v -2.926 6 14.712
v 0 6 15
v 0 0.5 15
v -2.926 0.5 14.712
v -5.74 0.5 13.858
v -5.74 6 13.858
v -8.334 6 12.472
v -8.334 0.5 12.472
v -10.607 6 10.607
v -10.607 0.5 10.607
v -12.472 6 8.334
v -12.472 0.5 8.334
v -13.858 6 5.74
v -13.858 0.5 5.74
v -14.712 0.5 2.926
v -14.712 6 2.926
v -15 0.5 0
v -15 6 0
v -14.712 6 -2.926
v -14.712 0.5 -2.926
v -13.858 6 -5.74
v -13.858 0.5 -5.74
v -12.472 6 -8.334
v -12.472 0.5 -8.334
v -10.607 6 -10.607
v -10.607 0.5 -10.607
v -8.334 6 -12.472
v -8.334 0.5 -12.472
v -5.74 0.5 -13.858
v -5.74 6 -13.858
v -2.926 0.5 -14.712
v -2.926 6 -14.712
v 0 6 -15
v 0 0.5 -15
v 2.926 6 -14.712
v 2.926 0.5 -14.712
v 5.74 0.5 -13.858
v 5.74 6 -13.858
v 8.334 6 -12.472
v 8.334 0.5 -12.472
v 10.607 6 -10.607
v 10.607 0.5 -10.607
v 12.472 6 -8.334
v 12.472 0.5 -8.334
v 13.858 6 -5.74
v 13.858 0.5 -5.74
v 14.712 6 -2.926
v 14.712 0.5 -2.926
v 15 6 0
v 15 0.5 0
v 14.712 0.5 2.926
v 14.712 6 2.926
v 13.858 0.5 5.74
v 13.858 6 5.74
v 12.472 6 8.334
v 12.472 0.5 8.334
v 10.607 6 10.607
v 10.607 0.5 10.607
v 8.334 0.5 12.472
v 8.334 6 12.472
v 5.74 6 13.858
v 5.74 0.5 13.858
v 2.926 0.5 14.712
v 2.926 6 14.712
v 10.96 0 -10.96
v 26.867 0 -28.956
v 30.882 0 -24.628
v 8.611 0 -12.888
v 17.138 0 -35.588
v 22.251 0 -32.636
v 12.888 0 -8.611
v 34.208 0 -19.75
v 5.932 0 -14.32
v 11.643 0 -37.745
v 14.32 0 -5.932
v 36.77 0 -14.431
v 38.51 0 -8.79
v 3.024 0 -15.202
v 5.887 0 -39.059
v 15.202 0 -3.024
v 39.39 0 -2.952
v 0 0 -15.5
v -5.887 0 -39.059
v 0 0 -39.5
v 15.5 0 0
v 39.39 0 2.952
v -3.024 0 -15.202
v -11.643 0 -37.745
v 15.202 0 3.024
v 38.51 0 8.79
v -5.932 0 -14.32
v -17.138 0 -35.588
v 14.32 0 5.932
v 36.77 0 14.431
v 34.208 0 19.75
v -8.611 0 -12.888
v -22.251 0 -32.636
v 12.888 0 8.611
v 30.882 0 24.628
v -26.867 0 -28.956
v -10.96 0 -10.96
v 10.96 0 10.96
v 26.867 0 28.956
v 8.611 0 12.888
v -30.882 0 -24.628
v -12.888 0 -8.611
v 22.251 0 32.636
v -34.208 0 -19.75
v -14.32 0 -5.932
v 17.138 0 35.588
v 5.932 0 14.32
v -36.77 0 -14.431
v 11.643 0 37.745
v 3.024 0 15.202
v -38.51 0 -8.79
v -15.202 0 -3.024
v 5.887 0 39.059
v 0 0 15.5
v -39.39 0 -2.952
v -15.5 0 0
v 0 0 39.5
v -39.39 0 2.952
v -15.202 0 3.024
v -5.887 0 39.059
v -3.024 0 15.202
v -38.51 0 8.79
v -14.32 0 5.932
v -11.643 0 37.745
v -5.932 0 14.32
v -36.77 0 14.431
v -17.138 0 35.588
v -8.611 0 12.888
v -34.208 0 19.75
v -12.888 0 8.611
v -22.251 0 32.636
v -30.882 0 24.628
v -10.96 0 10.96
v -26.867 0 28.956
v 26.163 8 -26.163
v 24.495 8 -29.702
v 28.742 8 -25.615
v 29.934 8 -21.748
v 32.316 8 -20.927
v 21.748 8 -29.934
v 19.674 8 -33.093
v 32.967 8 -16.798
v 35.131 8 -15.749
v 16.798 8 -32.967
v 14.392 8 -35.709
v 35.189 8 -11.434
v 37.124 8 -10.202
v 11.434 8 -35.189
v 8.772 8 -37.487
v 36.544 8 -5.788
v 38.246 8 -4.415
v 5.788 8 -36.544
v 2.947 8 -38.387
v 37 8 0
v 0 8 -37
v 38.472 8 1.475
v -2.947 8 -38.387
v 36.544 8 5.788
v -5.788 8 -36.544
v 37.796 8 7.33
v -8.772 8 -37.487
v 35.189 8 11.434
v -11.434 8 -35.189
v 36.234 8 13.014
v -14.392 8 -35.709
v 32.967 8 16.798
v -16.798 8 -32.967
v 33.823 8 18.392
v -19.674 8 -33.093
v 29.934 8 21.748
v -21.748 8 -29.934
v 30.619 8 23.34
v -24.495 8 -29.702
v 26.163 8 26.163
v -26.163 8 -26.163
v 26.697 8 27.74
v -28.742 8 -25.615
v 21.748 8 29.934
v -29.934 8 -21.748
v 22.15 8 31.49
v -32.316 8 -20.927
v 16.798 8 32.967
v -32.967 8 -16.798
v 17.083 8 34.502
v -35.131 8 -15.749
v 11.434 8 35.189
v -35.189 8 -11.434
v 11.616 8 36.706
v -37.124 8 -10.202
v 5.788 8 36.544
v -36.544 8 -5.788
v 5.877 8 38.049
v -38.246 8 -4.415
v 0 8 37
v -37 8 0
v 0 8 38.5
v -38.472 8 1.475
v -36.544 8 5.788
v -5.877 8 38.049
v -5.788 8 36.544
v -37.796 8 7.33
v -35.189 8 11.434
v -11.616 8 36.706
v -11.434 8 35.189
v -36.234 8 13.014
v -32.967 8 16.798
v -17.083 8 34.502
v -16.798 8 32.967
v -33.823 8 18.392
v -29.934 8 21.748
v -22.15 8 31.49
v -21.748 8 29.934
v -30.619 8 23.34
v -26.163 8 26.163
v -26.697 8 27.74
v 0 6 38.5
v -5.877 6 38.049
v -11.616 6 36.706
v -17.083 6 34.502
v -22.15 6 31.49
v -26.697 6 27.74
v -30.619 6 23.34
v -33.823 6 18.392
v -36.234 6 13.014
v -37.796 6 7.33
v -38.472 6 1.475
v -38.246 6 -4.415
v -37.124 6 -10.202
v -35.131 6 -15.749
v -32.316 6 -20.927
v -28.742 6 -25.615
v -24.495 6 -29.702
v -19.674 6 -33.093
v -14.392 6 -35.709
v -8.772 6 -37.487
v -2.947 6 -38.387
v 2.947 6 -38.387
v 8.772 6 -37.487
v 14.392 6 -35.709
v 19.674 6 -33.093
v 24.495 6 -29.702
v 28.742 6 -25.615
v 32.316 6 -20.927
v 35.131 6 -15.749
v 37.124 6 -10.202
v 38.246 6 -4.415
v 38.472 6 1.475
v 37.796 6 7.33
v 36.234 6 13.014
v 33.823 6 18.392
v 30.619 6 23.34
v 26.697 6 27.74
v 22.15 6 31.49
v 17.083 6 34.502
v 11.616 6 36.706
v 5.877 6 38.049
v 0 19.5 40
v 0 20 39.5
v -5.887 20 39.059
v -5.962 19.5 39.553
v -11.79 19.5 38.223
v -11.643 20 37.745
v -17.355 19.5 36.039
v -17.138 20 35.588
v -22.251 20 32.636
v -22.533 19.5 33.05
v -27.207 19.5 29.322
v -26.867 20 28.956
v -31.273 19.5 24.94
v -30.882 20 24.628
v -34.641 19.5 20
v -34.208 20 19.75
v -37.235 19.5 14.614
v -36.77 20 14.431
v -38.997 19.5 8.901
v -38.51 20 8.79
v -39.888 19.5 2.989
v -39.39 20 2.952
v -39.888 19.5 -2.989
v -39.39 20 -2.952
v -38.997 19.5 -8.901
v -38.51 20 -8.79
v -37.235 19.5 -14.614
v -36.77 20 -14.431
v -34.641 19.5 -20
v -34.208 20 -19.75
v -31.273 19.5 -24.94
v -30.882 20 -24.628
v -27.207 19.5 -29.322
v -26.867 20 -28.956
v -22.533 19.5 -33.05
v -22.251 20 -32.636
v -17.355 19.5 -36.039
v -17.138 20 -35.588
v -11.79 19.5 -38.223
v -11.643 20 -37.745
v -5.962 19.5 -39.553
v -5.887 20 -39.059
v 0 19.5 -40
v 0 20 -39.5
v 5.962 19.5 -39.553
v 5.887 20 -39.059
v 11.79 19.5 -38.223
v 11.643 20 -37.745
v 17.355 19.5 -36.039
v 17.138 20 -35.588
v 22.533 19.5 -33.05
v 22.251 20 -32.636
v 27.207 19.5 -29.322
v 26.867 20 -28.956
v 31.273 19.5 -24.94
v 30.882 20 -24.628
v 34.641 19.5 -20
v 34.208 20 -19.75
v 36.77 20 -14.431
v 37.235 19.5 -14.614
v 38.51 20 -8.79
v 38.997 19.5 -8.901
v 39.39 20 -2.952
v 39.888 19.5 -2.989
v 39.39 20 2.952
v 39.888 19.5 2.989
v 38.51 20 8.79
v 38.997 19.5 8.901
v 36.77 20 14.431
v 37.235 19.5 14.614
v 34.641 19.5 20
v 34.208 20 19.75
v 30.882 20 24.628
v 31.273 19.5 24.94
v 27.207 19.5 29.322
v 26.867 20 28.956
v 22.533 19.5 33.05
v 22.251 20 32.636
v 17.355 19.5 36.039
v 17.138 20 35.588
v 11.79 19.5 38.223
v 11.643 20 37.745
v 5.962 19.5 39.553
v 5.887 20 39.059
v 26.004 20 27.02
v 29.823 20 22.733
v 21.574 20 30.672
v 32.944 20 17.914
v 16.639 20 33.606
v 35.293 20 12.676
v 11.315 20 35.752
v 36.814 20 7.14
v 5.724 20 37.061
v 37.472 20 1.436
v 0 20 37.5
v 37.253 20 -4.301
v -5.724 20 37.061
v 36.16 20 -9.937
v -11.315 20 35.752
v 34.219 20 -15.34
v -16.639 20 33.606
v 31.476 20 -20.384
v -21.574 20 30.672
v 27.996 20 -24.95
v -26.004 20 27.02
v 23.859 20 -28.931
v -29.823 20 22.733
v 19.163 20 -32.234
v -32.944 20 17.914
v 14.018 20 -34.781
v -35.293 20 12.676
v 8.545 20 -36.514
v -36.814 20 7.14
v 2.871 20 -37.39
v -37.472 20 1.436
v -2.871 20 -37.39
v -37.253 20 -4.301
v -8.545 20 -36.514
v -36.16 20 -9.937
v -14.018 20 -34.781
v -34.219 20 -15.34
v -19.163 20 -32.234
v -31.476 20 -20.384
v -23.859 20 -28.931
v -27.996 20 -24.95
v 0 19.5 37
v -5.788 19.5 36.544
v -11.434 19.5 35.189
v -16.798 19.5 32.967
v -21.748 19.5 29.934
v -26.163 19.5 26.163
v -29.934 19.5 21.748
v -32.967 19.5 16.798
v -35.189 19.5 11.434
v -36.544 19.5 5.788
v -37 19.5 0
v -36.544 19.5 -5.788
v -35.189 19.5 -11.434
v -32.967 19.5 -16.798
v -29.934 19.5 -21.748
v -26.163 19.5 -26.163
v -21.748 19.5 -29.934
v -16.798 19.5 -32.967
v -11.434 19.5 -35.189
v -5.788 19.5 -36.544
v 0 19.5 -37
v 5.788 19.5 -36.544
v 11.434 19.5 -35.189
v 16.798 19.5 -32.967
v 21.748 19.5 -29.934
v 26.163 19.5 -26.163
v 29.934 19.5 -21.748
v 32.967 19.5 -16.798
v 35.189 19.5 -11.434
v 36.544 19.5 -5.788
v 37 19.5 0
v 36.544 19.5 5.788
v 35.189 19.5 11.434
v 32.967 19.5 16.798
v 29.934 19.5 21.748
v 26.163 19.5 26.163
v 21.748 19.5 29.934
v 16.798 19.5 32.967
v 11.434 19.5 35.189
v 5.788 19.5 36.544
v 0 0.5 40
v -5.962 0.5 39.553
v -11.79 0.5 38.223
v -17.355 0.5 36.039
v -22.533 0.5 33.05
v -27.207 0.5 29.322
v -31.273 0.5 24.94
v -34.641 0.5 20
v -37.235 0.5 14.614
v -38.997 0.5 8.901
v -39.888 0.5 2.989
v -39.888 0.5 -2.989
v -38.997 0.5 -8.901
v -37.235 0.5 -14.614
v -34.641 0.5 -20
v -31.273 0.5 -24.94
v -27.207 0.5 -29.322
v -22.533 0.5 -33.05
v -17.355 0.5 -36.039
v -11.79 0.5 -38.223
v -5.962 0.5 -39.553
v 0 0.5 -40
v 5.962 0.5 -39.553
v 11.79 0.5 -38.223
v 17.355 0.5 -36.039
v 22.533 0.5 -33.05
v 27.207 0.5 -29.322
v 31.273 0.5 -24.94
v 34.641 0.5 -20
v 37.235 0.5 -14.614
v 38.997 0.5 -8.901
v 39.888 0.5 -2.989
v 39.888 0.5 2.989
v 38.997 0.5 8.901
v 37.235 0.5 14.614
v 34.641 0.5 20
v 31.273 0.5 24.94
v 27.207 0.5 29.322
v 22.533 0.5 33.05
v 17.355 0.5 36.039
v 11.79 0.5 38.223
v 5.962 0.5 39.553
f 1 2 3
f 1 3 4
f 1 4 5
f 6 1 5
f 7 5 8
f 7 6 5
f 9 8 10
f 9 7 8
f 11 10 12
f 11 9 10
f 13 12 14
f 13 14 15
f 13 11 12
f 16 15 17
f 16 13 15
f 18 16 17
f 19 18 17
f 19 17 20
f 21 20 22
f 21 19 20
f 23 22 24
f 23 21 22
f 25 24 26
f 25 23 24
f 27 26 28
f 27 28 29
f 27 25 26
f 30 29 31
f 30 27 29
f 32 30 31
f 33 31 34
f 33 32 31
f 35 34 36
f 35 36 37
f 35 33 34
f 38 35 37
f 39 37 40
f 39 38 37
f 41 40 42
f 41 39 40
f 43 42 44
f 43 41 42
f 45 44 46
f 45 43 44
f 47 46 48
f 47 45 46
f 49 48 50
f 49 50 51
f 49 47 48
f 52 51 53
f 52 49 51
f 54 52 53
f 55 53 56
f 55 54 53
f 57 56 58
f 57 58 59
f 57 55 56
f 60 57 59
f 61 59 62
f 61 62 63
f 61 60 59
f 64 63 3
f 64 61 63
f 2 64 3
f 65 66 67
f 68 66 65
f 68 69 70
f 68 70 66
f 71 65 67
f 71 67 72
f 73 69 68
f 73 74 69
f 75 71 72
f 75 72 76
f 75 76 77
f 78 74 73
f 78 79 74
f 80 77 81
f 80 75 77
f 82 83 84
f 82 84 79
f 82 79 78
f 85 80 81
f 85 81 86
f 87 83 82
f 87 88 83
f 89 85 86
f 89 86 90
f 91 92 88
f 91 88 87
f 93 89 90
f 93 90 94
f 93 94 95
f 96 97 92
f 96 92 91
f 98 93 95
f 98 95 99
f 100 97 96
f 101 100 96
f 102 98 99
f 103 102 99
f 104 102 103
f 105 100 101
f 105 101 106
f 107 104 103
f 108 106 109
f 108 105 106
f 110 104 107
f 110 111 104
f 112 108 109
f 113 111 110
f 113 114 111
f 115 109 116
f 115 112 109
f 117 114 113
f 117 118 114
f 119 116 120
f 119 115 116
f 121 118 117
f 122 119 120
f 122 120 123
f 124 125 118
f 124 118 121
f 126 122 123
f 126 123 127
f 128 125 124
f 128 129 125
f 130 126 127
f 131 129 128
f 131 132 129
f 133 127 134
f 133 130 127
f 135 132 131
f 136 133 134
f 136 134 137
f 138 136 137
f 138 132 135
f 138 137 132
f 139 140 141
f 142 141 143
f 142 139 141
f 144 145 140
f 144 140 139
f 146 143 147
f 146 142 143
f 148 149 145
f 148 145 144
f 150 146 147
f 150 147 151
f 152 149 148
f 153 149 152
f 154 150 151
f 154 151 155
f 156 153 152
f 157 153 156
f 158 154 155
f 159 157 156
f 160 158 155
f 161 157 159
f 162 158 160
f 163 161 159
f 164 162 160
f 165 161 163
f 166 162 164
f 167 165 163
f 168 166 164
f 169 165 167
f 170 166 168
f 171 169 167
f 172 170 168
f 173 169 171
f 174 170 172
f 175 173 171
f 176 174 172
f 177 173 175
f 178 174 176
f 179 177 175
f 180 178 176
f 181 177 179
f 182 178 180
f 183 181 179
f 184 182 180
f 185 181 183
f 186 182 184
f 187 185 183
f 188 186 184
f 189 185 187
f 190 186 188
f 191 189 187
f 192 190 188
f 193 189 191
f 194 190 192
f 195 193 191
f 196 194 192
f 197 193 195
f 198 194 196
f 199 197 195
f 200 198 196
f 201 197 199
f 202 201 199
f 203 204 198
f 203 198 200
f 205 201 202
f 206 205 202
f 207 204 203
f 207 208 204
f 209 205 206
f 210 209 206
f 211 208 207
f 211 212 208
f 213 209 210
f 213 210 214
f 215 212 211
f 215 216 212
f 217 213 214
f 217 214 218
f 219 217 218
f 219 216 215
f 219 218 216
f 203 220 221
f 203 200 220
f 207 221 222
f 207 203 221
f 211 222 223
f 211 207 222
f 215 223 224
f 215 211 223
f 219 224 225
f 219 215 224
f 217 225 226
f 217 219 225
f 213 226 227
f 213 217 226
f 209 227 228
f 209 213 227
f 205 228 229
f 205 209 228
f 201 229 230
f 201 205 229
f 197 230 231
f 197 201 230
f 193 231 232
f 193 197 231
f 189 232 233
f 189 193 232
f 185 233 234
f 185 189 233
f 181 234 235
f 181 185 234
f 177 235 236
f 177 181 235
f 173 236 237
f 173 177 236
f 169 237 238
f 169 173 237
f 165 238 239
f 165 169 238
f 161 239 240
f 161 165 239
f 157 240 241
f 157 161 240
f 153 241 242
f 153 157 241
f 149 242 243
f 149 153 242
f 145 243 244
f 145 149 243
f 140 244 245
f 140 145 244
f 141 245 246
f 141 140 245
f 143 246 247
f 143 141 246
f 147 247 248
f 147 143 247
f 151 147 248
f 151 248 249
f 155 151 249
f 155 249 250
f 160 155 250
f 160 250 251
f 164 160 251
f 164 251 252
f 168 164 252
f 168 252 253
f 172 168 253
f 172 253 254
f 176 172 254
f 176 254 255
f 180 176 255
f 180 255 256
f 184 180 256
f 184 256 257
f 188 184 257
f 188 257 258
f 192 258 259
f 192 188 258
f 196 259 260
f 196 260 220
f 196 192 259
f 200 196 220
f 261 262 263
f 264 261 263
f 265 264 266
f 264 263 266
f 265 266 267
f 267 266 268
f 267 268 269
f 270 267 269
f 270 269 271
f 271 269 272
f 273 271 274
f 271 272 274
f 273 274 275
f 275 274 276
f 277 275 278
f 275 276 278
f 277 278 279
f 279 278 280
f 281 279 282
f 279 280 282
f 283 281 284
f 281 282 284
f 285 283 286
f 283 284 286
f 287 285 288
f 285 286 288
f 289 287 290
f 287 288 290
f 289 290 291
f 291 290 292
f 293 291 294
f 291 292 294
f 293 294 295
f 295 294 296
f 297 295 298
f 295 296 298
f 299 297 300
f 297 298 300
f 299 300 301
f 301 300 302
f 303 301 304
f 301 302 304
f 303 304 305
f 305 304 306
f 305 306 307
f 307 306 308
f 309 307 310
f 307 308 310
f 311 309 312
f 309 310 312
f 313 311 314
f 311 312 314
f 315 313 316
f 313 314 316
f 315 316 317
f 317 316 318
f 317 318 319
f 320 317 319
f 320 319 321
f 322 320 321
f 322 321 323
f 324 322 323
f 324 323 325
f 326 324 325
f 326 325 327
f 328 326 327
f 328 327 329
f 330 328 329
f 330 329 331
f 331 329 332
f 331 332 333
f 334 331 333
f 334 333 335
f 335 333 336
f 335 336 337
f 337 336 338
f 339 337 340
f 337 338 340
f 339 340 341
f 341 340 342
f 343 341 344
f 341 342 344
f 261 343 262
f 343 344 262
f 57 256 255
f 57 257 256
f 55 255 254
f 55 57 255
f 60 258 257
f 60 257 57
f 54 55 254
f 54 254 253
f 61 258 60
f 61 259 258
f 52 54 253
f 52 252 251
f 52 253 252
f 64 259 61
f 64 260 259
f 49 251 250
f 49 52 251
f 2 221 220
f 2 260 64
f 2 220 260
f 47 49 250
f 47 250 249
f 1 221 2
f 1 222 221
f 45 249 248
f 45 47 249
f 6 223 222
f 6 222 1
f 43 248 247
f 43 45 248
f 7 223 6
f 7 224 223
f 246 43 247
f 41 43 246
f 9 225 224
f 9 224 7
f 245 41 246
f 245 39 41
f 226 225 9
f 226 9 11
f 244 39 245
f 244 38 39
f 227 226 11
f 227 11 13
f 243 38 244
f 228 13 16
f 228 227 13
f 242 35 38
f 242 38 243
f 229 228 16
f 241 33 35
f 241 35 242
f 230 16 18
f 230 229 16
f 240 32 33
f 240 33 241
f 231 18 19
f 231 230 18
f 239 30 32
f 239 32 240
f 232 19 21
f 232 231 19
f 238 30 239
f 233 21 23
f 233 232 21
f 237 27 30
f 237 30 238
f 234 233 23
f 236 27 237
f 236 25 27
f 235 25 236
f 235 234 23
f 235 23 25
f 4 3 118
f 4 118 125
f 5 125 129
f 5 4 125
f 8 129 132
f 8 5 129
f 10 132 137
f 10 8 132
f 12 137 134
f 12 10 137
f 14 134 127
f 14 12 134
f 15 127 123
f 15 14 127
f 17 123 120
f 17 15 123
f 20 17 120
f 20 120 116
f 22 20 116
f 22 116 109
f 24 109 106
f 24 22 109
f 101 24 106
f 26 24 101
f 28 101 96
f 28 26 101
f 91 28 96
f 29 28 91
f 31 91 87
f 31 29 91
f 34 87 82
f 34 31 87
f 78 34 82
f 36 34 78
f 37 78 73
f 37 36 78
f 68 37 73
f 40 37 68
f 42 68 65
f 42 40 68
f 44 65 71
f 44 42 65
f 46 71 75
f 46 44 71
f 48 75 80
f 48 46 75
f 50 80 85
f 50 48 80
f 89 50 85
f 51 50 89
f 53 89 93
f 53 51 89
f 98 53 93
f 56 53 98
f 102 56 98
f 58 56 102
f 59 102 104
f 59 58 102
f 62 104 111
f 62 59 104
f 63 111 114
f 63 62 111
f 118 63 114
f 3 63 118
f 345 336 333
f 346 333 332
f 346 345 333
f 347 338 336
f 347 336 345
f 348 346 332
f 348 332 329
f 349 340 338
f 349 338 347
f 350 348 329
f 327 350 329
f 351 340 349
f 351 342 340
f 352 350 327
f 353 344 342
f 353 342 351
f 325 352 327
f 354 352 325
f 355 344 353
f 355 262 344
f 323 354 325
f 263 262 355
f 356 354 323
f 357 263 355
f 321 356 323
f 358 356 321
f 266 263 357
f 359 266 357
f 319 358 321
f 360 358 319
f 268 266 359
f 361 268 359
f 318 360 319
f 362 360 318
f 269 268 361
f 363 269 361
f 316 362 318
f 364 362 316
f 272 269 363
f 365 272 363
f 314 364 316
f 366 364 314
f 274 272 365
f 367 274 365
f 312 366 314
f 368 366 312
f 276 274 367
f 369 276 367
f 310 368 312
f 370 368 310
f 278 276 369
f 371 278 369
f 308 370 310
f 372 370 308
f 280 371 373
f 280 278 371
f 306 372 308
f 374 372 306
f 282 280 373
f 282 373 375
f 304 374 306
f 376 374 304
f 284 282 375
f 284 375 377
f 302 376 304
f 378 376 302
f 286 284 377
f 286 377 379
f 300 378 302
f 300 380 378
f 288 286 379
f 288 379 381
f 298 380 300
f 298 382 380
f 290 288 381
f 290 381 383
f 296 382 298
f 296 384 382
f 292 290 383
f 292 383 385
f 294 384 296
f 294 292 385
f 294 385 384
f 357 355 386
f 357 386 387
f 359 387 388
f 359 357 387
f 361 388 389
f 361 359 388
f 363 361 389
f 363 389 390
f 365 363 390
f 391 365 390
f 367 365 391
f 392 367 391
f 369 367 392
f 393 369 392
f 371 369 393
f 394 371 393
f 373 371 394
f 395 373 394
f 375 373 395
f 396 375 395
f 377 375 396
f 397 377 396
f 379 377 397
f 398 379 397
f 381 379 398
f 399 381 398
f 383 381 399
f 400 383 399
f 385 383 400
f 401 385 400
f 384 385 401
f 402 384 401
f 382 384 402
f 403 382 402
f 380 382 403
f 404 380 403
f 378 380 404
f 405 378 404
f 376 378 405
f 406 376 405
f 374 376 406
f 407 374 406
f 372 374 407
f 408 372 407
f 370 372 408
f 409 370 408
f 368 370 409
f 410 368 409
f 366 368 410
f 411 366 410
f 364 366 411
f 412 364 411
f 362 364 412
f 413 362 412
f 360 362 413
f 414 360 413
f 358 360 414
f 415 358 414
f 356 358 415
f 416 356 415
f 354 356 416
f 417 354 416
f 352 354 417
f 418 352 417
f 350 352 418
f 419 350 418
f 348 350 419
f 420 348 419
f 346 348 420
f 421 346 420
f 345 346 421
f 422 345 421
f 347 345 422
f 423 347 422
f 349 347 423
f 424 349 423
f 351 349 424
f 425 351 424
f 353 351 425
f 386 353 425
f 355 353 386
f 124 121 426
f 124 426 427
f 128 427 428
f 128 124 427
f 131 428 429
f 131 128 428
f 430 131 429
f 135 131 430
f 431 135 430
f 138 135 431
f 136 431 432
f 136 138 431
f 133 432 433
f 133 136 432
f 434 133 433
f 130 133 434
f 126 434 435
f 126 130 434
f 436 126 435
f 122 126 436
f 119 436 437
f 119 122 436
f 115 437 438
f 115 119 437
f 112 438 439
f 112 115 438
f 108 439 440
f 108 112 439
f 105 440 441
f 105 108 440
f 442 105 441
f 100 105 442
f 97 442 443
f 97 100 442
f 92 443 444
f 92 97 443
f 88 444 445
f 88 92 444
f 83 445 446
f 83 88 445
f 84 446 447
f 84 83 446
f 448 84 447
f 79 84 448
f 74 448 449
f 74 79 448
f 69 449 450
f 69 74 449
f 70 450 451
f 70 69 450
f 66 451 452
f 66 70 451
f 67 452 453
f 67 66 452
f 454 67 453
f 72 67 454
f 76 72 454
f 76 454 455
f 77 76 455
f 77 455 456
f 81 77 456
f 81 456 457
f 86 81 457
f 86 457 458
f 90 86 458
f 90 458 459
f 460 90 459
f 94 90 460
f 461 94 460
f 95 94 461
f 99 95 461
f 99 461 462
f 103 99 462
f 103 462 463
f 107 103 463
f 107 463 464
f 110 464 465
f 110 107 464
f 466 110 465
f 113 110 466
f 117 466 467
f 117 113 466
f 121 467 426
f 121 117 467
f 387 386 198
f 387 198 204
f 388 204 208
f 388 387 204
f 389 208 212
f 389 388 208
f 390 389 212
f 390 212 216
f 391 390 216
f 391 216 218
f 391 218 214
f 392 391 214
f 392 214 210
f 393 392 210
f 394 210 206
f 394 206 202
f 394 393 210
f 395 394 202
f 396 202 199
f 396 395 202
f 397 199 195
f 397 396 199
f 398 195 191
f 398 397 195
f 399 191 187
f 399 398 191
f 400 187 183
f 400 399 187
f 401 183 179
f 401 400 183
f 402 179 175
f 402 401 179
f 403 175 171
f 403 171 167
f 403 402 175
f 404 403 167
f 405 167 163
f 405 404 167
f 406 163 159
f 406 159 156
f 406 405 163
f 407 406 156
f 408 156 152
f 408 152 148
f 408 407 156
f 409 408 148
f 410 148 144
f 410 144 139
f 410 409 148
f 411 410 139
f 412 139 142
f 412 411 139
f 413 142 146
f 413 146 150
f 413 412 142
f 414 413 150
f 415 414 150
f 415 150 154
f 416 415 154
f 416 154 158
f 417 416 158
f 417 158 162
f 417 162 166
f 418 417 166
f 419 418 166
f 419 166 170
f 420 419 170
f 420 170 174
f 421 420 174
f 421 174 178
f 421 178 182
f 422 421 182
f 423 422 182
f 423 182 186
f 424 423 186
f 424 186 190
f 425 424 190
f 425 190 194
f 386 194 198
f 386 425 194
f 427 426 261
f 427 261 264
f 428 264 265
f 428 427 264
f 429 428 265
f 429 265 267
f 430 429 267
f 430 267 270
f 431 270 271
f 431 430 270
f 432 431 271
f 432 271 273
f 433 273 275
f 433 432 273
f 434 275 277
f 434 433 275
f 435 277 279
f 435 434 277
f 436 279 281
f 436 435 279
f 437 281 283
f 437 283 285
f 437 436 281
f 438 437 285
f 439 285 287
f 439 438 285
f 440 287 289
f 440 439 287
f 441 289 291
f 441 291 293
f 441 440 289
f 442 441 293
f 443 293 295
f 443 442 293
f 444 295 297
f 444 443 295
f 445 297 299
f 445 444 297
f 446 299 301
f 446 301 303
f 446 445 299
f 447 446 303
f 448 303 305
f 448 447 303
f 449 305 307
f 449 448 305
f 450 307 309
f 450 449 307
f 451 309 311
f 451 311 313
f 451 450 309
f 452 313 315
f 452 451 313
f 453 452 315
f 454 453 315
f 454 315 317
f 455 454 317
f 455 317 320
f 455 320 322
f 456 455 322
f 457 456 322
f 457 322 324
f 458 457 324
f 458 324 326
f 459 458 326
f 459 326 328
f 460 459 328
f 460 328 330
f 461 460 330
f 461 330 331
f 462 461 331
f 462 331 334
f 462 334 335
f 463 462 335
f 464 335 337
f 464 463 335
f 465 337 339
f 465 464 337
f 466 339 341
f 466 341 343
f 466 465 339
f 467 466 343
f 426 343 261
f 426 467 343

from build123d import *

# Parameters (mm, degrees)
CHAMFER_1_SIZE = 0.5


with BuildPart() as part:
    # Эскиз1 → Повернуть1 (revolve)
    with BuildSketch(Plane.XY):
        Polygon((-40, 20), (-40, 0), (-15, 0), (-15, 6), (-38.5, 6), (-38.5, 8), (-37, 8), (-37, 20), align=None)
    revolve(axis=Axis((0, 26.168985987, 0), (0, -1, 0)))

    # Фаска1
    chamfer_1_edges = [part.edges().sort_by_distance(p)[0] for p in [
        (15, 0, 0),
        (40, 0, 0),
        (40, 20, 0),
        (37, 20, 0),
    ]]
    chamfer(chamfer_1_edges, length=CHAMFER_1_SIZE)


solid = part.part
